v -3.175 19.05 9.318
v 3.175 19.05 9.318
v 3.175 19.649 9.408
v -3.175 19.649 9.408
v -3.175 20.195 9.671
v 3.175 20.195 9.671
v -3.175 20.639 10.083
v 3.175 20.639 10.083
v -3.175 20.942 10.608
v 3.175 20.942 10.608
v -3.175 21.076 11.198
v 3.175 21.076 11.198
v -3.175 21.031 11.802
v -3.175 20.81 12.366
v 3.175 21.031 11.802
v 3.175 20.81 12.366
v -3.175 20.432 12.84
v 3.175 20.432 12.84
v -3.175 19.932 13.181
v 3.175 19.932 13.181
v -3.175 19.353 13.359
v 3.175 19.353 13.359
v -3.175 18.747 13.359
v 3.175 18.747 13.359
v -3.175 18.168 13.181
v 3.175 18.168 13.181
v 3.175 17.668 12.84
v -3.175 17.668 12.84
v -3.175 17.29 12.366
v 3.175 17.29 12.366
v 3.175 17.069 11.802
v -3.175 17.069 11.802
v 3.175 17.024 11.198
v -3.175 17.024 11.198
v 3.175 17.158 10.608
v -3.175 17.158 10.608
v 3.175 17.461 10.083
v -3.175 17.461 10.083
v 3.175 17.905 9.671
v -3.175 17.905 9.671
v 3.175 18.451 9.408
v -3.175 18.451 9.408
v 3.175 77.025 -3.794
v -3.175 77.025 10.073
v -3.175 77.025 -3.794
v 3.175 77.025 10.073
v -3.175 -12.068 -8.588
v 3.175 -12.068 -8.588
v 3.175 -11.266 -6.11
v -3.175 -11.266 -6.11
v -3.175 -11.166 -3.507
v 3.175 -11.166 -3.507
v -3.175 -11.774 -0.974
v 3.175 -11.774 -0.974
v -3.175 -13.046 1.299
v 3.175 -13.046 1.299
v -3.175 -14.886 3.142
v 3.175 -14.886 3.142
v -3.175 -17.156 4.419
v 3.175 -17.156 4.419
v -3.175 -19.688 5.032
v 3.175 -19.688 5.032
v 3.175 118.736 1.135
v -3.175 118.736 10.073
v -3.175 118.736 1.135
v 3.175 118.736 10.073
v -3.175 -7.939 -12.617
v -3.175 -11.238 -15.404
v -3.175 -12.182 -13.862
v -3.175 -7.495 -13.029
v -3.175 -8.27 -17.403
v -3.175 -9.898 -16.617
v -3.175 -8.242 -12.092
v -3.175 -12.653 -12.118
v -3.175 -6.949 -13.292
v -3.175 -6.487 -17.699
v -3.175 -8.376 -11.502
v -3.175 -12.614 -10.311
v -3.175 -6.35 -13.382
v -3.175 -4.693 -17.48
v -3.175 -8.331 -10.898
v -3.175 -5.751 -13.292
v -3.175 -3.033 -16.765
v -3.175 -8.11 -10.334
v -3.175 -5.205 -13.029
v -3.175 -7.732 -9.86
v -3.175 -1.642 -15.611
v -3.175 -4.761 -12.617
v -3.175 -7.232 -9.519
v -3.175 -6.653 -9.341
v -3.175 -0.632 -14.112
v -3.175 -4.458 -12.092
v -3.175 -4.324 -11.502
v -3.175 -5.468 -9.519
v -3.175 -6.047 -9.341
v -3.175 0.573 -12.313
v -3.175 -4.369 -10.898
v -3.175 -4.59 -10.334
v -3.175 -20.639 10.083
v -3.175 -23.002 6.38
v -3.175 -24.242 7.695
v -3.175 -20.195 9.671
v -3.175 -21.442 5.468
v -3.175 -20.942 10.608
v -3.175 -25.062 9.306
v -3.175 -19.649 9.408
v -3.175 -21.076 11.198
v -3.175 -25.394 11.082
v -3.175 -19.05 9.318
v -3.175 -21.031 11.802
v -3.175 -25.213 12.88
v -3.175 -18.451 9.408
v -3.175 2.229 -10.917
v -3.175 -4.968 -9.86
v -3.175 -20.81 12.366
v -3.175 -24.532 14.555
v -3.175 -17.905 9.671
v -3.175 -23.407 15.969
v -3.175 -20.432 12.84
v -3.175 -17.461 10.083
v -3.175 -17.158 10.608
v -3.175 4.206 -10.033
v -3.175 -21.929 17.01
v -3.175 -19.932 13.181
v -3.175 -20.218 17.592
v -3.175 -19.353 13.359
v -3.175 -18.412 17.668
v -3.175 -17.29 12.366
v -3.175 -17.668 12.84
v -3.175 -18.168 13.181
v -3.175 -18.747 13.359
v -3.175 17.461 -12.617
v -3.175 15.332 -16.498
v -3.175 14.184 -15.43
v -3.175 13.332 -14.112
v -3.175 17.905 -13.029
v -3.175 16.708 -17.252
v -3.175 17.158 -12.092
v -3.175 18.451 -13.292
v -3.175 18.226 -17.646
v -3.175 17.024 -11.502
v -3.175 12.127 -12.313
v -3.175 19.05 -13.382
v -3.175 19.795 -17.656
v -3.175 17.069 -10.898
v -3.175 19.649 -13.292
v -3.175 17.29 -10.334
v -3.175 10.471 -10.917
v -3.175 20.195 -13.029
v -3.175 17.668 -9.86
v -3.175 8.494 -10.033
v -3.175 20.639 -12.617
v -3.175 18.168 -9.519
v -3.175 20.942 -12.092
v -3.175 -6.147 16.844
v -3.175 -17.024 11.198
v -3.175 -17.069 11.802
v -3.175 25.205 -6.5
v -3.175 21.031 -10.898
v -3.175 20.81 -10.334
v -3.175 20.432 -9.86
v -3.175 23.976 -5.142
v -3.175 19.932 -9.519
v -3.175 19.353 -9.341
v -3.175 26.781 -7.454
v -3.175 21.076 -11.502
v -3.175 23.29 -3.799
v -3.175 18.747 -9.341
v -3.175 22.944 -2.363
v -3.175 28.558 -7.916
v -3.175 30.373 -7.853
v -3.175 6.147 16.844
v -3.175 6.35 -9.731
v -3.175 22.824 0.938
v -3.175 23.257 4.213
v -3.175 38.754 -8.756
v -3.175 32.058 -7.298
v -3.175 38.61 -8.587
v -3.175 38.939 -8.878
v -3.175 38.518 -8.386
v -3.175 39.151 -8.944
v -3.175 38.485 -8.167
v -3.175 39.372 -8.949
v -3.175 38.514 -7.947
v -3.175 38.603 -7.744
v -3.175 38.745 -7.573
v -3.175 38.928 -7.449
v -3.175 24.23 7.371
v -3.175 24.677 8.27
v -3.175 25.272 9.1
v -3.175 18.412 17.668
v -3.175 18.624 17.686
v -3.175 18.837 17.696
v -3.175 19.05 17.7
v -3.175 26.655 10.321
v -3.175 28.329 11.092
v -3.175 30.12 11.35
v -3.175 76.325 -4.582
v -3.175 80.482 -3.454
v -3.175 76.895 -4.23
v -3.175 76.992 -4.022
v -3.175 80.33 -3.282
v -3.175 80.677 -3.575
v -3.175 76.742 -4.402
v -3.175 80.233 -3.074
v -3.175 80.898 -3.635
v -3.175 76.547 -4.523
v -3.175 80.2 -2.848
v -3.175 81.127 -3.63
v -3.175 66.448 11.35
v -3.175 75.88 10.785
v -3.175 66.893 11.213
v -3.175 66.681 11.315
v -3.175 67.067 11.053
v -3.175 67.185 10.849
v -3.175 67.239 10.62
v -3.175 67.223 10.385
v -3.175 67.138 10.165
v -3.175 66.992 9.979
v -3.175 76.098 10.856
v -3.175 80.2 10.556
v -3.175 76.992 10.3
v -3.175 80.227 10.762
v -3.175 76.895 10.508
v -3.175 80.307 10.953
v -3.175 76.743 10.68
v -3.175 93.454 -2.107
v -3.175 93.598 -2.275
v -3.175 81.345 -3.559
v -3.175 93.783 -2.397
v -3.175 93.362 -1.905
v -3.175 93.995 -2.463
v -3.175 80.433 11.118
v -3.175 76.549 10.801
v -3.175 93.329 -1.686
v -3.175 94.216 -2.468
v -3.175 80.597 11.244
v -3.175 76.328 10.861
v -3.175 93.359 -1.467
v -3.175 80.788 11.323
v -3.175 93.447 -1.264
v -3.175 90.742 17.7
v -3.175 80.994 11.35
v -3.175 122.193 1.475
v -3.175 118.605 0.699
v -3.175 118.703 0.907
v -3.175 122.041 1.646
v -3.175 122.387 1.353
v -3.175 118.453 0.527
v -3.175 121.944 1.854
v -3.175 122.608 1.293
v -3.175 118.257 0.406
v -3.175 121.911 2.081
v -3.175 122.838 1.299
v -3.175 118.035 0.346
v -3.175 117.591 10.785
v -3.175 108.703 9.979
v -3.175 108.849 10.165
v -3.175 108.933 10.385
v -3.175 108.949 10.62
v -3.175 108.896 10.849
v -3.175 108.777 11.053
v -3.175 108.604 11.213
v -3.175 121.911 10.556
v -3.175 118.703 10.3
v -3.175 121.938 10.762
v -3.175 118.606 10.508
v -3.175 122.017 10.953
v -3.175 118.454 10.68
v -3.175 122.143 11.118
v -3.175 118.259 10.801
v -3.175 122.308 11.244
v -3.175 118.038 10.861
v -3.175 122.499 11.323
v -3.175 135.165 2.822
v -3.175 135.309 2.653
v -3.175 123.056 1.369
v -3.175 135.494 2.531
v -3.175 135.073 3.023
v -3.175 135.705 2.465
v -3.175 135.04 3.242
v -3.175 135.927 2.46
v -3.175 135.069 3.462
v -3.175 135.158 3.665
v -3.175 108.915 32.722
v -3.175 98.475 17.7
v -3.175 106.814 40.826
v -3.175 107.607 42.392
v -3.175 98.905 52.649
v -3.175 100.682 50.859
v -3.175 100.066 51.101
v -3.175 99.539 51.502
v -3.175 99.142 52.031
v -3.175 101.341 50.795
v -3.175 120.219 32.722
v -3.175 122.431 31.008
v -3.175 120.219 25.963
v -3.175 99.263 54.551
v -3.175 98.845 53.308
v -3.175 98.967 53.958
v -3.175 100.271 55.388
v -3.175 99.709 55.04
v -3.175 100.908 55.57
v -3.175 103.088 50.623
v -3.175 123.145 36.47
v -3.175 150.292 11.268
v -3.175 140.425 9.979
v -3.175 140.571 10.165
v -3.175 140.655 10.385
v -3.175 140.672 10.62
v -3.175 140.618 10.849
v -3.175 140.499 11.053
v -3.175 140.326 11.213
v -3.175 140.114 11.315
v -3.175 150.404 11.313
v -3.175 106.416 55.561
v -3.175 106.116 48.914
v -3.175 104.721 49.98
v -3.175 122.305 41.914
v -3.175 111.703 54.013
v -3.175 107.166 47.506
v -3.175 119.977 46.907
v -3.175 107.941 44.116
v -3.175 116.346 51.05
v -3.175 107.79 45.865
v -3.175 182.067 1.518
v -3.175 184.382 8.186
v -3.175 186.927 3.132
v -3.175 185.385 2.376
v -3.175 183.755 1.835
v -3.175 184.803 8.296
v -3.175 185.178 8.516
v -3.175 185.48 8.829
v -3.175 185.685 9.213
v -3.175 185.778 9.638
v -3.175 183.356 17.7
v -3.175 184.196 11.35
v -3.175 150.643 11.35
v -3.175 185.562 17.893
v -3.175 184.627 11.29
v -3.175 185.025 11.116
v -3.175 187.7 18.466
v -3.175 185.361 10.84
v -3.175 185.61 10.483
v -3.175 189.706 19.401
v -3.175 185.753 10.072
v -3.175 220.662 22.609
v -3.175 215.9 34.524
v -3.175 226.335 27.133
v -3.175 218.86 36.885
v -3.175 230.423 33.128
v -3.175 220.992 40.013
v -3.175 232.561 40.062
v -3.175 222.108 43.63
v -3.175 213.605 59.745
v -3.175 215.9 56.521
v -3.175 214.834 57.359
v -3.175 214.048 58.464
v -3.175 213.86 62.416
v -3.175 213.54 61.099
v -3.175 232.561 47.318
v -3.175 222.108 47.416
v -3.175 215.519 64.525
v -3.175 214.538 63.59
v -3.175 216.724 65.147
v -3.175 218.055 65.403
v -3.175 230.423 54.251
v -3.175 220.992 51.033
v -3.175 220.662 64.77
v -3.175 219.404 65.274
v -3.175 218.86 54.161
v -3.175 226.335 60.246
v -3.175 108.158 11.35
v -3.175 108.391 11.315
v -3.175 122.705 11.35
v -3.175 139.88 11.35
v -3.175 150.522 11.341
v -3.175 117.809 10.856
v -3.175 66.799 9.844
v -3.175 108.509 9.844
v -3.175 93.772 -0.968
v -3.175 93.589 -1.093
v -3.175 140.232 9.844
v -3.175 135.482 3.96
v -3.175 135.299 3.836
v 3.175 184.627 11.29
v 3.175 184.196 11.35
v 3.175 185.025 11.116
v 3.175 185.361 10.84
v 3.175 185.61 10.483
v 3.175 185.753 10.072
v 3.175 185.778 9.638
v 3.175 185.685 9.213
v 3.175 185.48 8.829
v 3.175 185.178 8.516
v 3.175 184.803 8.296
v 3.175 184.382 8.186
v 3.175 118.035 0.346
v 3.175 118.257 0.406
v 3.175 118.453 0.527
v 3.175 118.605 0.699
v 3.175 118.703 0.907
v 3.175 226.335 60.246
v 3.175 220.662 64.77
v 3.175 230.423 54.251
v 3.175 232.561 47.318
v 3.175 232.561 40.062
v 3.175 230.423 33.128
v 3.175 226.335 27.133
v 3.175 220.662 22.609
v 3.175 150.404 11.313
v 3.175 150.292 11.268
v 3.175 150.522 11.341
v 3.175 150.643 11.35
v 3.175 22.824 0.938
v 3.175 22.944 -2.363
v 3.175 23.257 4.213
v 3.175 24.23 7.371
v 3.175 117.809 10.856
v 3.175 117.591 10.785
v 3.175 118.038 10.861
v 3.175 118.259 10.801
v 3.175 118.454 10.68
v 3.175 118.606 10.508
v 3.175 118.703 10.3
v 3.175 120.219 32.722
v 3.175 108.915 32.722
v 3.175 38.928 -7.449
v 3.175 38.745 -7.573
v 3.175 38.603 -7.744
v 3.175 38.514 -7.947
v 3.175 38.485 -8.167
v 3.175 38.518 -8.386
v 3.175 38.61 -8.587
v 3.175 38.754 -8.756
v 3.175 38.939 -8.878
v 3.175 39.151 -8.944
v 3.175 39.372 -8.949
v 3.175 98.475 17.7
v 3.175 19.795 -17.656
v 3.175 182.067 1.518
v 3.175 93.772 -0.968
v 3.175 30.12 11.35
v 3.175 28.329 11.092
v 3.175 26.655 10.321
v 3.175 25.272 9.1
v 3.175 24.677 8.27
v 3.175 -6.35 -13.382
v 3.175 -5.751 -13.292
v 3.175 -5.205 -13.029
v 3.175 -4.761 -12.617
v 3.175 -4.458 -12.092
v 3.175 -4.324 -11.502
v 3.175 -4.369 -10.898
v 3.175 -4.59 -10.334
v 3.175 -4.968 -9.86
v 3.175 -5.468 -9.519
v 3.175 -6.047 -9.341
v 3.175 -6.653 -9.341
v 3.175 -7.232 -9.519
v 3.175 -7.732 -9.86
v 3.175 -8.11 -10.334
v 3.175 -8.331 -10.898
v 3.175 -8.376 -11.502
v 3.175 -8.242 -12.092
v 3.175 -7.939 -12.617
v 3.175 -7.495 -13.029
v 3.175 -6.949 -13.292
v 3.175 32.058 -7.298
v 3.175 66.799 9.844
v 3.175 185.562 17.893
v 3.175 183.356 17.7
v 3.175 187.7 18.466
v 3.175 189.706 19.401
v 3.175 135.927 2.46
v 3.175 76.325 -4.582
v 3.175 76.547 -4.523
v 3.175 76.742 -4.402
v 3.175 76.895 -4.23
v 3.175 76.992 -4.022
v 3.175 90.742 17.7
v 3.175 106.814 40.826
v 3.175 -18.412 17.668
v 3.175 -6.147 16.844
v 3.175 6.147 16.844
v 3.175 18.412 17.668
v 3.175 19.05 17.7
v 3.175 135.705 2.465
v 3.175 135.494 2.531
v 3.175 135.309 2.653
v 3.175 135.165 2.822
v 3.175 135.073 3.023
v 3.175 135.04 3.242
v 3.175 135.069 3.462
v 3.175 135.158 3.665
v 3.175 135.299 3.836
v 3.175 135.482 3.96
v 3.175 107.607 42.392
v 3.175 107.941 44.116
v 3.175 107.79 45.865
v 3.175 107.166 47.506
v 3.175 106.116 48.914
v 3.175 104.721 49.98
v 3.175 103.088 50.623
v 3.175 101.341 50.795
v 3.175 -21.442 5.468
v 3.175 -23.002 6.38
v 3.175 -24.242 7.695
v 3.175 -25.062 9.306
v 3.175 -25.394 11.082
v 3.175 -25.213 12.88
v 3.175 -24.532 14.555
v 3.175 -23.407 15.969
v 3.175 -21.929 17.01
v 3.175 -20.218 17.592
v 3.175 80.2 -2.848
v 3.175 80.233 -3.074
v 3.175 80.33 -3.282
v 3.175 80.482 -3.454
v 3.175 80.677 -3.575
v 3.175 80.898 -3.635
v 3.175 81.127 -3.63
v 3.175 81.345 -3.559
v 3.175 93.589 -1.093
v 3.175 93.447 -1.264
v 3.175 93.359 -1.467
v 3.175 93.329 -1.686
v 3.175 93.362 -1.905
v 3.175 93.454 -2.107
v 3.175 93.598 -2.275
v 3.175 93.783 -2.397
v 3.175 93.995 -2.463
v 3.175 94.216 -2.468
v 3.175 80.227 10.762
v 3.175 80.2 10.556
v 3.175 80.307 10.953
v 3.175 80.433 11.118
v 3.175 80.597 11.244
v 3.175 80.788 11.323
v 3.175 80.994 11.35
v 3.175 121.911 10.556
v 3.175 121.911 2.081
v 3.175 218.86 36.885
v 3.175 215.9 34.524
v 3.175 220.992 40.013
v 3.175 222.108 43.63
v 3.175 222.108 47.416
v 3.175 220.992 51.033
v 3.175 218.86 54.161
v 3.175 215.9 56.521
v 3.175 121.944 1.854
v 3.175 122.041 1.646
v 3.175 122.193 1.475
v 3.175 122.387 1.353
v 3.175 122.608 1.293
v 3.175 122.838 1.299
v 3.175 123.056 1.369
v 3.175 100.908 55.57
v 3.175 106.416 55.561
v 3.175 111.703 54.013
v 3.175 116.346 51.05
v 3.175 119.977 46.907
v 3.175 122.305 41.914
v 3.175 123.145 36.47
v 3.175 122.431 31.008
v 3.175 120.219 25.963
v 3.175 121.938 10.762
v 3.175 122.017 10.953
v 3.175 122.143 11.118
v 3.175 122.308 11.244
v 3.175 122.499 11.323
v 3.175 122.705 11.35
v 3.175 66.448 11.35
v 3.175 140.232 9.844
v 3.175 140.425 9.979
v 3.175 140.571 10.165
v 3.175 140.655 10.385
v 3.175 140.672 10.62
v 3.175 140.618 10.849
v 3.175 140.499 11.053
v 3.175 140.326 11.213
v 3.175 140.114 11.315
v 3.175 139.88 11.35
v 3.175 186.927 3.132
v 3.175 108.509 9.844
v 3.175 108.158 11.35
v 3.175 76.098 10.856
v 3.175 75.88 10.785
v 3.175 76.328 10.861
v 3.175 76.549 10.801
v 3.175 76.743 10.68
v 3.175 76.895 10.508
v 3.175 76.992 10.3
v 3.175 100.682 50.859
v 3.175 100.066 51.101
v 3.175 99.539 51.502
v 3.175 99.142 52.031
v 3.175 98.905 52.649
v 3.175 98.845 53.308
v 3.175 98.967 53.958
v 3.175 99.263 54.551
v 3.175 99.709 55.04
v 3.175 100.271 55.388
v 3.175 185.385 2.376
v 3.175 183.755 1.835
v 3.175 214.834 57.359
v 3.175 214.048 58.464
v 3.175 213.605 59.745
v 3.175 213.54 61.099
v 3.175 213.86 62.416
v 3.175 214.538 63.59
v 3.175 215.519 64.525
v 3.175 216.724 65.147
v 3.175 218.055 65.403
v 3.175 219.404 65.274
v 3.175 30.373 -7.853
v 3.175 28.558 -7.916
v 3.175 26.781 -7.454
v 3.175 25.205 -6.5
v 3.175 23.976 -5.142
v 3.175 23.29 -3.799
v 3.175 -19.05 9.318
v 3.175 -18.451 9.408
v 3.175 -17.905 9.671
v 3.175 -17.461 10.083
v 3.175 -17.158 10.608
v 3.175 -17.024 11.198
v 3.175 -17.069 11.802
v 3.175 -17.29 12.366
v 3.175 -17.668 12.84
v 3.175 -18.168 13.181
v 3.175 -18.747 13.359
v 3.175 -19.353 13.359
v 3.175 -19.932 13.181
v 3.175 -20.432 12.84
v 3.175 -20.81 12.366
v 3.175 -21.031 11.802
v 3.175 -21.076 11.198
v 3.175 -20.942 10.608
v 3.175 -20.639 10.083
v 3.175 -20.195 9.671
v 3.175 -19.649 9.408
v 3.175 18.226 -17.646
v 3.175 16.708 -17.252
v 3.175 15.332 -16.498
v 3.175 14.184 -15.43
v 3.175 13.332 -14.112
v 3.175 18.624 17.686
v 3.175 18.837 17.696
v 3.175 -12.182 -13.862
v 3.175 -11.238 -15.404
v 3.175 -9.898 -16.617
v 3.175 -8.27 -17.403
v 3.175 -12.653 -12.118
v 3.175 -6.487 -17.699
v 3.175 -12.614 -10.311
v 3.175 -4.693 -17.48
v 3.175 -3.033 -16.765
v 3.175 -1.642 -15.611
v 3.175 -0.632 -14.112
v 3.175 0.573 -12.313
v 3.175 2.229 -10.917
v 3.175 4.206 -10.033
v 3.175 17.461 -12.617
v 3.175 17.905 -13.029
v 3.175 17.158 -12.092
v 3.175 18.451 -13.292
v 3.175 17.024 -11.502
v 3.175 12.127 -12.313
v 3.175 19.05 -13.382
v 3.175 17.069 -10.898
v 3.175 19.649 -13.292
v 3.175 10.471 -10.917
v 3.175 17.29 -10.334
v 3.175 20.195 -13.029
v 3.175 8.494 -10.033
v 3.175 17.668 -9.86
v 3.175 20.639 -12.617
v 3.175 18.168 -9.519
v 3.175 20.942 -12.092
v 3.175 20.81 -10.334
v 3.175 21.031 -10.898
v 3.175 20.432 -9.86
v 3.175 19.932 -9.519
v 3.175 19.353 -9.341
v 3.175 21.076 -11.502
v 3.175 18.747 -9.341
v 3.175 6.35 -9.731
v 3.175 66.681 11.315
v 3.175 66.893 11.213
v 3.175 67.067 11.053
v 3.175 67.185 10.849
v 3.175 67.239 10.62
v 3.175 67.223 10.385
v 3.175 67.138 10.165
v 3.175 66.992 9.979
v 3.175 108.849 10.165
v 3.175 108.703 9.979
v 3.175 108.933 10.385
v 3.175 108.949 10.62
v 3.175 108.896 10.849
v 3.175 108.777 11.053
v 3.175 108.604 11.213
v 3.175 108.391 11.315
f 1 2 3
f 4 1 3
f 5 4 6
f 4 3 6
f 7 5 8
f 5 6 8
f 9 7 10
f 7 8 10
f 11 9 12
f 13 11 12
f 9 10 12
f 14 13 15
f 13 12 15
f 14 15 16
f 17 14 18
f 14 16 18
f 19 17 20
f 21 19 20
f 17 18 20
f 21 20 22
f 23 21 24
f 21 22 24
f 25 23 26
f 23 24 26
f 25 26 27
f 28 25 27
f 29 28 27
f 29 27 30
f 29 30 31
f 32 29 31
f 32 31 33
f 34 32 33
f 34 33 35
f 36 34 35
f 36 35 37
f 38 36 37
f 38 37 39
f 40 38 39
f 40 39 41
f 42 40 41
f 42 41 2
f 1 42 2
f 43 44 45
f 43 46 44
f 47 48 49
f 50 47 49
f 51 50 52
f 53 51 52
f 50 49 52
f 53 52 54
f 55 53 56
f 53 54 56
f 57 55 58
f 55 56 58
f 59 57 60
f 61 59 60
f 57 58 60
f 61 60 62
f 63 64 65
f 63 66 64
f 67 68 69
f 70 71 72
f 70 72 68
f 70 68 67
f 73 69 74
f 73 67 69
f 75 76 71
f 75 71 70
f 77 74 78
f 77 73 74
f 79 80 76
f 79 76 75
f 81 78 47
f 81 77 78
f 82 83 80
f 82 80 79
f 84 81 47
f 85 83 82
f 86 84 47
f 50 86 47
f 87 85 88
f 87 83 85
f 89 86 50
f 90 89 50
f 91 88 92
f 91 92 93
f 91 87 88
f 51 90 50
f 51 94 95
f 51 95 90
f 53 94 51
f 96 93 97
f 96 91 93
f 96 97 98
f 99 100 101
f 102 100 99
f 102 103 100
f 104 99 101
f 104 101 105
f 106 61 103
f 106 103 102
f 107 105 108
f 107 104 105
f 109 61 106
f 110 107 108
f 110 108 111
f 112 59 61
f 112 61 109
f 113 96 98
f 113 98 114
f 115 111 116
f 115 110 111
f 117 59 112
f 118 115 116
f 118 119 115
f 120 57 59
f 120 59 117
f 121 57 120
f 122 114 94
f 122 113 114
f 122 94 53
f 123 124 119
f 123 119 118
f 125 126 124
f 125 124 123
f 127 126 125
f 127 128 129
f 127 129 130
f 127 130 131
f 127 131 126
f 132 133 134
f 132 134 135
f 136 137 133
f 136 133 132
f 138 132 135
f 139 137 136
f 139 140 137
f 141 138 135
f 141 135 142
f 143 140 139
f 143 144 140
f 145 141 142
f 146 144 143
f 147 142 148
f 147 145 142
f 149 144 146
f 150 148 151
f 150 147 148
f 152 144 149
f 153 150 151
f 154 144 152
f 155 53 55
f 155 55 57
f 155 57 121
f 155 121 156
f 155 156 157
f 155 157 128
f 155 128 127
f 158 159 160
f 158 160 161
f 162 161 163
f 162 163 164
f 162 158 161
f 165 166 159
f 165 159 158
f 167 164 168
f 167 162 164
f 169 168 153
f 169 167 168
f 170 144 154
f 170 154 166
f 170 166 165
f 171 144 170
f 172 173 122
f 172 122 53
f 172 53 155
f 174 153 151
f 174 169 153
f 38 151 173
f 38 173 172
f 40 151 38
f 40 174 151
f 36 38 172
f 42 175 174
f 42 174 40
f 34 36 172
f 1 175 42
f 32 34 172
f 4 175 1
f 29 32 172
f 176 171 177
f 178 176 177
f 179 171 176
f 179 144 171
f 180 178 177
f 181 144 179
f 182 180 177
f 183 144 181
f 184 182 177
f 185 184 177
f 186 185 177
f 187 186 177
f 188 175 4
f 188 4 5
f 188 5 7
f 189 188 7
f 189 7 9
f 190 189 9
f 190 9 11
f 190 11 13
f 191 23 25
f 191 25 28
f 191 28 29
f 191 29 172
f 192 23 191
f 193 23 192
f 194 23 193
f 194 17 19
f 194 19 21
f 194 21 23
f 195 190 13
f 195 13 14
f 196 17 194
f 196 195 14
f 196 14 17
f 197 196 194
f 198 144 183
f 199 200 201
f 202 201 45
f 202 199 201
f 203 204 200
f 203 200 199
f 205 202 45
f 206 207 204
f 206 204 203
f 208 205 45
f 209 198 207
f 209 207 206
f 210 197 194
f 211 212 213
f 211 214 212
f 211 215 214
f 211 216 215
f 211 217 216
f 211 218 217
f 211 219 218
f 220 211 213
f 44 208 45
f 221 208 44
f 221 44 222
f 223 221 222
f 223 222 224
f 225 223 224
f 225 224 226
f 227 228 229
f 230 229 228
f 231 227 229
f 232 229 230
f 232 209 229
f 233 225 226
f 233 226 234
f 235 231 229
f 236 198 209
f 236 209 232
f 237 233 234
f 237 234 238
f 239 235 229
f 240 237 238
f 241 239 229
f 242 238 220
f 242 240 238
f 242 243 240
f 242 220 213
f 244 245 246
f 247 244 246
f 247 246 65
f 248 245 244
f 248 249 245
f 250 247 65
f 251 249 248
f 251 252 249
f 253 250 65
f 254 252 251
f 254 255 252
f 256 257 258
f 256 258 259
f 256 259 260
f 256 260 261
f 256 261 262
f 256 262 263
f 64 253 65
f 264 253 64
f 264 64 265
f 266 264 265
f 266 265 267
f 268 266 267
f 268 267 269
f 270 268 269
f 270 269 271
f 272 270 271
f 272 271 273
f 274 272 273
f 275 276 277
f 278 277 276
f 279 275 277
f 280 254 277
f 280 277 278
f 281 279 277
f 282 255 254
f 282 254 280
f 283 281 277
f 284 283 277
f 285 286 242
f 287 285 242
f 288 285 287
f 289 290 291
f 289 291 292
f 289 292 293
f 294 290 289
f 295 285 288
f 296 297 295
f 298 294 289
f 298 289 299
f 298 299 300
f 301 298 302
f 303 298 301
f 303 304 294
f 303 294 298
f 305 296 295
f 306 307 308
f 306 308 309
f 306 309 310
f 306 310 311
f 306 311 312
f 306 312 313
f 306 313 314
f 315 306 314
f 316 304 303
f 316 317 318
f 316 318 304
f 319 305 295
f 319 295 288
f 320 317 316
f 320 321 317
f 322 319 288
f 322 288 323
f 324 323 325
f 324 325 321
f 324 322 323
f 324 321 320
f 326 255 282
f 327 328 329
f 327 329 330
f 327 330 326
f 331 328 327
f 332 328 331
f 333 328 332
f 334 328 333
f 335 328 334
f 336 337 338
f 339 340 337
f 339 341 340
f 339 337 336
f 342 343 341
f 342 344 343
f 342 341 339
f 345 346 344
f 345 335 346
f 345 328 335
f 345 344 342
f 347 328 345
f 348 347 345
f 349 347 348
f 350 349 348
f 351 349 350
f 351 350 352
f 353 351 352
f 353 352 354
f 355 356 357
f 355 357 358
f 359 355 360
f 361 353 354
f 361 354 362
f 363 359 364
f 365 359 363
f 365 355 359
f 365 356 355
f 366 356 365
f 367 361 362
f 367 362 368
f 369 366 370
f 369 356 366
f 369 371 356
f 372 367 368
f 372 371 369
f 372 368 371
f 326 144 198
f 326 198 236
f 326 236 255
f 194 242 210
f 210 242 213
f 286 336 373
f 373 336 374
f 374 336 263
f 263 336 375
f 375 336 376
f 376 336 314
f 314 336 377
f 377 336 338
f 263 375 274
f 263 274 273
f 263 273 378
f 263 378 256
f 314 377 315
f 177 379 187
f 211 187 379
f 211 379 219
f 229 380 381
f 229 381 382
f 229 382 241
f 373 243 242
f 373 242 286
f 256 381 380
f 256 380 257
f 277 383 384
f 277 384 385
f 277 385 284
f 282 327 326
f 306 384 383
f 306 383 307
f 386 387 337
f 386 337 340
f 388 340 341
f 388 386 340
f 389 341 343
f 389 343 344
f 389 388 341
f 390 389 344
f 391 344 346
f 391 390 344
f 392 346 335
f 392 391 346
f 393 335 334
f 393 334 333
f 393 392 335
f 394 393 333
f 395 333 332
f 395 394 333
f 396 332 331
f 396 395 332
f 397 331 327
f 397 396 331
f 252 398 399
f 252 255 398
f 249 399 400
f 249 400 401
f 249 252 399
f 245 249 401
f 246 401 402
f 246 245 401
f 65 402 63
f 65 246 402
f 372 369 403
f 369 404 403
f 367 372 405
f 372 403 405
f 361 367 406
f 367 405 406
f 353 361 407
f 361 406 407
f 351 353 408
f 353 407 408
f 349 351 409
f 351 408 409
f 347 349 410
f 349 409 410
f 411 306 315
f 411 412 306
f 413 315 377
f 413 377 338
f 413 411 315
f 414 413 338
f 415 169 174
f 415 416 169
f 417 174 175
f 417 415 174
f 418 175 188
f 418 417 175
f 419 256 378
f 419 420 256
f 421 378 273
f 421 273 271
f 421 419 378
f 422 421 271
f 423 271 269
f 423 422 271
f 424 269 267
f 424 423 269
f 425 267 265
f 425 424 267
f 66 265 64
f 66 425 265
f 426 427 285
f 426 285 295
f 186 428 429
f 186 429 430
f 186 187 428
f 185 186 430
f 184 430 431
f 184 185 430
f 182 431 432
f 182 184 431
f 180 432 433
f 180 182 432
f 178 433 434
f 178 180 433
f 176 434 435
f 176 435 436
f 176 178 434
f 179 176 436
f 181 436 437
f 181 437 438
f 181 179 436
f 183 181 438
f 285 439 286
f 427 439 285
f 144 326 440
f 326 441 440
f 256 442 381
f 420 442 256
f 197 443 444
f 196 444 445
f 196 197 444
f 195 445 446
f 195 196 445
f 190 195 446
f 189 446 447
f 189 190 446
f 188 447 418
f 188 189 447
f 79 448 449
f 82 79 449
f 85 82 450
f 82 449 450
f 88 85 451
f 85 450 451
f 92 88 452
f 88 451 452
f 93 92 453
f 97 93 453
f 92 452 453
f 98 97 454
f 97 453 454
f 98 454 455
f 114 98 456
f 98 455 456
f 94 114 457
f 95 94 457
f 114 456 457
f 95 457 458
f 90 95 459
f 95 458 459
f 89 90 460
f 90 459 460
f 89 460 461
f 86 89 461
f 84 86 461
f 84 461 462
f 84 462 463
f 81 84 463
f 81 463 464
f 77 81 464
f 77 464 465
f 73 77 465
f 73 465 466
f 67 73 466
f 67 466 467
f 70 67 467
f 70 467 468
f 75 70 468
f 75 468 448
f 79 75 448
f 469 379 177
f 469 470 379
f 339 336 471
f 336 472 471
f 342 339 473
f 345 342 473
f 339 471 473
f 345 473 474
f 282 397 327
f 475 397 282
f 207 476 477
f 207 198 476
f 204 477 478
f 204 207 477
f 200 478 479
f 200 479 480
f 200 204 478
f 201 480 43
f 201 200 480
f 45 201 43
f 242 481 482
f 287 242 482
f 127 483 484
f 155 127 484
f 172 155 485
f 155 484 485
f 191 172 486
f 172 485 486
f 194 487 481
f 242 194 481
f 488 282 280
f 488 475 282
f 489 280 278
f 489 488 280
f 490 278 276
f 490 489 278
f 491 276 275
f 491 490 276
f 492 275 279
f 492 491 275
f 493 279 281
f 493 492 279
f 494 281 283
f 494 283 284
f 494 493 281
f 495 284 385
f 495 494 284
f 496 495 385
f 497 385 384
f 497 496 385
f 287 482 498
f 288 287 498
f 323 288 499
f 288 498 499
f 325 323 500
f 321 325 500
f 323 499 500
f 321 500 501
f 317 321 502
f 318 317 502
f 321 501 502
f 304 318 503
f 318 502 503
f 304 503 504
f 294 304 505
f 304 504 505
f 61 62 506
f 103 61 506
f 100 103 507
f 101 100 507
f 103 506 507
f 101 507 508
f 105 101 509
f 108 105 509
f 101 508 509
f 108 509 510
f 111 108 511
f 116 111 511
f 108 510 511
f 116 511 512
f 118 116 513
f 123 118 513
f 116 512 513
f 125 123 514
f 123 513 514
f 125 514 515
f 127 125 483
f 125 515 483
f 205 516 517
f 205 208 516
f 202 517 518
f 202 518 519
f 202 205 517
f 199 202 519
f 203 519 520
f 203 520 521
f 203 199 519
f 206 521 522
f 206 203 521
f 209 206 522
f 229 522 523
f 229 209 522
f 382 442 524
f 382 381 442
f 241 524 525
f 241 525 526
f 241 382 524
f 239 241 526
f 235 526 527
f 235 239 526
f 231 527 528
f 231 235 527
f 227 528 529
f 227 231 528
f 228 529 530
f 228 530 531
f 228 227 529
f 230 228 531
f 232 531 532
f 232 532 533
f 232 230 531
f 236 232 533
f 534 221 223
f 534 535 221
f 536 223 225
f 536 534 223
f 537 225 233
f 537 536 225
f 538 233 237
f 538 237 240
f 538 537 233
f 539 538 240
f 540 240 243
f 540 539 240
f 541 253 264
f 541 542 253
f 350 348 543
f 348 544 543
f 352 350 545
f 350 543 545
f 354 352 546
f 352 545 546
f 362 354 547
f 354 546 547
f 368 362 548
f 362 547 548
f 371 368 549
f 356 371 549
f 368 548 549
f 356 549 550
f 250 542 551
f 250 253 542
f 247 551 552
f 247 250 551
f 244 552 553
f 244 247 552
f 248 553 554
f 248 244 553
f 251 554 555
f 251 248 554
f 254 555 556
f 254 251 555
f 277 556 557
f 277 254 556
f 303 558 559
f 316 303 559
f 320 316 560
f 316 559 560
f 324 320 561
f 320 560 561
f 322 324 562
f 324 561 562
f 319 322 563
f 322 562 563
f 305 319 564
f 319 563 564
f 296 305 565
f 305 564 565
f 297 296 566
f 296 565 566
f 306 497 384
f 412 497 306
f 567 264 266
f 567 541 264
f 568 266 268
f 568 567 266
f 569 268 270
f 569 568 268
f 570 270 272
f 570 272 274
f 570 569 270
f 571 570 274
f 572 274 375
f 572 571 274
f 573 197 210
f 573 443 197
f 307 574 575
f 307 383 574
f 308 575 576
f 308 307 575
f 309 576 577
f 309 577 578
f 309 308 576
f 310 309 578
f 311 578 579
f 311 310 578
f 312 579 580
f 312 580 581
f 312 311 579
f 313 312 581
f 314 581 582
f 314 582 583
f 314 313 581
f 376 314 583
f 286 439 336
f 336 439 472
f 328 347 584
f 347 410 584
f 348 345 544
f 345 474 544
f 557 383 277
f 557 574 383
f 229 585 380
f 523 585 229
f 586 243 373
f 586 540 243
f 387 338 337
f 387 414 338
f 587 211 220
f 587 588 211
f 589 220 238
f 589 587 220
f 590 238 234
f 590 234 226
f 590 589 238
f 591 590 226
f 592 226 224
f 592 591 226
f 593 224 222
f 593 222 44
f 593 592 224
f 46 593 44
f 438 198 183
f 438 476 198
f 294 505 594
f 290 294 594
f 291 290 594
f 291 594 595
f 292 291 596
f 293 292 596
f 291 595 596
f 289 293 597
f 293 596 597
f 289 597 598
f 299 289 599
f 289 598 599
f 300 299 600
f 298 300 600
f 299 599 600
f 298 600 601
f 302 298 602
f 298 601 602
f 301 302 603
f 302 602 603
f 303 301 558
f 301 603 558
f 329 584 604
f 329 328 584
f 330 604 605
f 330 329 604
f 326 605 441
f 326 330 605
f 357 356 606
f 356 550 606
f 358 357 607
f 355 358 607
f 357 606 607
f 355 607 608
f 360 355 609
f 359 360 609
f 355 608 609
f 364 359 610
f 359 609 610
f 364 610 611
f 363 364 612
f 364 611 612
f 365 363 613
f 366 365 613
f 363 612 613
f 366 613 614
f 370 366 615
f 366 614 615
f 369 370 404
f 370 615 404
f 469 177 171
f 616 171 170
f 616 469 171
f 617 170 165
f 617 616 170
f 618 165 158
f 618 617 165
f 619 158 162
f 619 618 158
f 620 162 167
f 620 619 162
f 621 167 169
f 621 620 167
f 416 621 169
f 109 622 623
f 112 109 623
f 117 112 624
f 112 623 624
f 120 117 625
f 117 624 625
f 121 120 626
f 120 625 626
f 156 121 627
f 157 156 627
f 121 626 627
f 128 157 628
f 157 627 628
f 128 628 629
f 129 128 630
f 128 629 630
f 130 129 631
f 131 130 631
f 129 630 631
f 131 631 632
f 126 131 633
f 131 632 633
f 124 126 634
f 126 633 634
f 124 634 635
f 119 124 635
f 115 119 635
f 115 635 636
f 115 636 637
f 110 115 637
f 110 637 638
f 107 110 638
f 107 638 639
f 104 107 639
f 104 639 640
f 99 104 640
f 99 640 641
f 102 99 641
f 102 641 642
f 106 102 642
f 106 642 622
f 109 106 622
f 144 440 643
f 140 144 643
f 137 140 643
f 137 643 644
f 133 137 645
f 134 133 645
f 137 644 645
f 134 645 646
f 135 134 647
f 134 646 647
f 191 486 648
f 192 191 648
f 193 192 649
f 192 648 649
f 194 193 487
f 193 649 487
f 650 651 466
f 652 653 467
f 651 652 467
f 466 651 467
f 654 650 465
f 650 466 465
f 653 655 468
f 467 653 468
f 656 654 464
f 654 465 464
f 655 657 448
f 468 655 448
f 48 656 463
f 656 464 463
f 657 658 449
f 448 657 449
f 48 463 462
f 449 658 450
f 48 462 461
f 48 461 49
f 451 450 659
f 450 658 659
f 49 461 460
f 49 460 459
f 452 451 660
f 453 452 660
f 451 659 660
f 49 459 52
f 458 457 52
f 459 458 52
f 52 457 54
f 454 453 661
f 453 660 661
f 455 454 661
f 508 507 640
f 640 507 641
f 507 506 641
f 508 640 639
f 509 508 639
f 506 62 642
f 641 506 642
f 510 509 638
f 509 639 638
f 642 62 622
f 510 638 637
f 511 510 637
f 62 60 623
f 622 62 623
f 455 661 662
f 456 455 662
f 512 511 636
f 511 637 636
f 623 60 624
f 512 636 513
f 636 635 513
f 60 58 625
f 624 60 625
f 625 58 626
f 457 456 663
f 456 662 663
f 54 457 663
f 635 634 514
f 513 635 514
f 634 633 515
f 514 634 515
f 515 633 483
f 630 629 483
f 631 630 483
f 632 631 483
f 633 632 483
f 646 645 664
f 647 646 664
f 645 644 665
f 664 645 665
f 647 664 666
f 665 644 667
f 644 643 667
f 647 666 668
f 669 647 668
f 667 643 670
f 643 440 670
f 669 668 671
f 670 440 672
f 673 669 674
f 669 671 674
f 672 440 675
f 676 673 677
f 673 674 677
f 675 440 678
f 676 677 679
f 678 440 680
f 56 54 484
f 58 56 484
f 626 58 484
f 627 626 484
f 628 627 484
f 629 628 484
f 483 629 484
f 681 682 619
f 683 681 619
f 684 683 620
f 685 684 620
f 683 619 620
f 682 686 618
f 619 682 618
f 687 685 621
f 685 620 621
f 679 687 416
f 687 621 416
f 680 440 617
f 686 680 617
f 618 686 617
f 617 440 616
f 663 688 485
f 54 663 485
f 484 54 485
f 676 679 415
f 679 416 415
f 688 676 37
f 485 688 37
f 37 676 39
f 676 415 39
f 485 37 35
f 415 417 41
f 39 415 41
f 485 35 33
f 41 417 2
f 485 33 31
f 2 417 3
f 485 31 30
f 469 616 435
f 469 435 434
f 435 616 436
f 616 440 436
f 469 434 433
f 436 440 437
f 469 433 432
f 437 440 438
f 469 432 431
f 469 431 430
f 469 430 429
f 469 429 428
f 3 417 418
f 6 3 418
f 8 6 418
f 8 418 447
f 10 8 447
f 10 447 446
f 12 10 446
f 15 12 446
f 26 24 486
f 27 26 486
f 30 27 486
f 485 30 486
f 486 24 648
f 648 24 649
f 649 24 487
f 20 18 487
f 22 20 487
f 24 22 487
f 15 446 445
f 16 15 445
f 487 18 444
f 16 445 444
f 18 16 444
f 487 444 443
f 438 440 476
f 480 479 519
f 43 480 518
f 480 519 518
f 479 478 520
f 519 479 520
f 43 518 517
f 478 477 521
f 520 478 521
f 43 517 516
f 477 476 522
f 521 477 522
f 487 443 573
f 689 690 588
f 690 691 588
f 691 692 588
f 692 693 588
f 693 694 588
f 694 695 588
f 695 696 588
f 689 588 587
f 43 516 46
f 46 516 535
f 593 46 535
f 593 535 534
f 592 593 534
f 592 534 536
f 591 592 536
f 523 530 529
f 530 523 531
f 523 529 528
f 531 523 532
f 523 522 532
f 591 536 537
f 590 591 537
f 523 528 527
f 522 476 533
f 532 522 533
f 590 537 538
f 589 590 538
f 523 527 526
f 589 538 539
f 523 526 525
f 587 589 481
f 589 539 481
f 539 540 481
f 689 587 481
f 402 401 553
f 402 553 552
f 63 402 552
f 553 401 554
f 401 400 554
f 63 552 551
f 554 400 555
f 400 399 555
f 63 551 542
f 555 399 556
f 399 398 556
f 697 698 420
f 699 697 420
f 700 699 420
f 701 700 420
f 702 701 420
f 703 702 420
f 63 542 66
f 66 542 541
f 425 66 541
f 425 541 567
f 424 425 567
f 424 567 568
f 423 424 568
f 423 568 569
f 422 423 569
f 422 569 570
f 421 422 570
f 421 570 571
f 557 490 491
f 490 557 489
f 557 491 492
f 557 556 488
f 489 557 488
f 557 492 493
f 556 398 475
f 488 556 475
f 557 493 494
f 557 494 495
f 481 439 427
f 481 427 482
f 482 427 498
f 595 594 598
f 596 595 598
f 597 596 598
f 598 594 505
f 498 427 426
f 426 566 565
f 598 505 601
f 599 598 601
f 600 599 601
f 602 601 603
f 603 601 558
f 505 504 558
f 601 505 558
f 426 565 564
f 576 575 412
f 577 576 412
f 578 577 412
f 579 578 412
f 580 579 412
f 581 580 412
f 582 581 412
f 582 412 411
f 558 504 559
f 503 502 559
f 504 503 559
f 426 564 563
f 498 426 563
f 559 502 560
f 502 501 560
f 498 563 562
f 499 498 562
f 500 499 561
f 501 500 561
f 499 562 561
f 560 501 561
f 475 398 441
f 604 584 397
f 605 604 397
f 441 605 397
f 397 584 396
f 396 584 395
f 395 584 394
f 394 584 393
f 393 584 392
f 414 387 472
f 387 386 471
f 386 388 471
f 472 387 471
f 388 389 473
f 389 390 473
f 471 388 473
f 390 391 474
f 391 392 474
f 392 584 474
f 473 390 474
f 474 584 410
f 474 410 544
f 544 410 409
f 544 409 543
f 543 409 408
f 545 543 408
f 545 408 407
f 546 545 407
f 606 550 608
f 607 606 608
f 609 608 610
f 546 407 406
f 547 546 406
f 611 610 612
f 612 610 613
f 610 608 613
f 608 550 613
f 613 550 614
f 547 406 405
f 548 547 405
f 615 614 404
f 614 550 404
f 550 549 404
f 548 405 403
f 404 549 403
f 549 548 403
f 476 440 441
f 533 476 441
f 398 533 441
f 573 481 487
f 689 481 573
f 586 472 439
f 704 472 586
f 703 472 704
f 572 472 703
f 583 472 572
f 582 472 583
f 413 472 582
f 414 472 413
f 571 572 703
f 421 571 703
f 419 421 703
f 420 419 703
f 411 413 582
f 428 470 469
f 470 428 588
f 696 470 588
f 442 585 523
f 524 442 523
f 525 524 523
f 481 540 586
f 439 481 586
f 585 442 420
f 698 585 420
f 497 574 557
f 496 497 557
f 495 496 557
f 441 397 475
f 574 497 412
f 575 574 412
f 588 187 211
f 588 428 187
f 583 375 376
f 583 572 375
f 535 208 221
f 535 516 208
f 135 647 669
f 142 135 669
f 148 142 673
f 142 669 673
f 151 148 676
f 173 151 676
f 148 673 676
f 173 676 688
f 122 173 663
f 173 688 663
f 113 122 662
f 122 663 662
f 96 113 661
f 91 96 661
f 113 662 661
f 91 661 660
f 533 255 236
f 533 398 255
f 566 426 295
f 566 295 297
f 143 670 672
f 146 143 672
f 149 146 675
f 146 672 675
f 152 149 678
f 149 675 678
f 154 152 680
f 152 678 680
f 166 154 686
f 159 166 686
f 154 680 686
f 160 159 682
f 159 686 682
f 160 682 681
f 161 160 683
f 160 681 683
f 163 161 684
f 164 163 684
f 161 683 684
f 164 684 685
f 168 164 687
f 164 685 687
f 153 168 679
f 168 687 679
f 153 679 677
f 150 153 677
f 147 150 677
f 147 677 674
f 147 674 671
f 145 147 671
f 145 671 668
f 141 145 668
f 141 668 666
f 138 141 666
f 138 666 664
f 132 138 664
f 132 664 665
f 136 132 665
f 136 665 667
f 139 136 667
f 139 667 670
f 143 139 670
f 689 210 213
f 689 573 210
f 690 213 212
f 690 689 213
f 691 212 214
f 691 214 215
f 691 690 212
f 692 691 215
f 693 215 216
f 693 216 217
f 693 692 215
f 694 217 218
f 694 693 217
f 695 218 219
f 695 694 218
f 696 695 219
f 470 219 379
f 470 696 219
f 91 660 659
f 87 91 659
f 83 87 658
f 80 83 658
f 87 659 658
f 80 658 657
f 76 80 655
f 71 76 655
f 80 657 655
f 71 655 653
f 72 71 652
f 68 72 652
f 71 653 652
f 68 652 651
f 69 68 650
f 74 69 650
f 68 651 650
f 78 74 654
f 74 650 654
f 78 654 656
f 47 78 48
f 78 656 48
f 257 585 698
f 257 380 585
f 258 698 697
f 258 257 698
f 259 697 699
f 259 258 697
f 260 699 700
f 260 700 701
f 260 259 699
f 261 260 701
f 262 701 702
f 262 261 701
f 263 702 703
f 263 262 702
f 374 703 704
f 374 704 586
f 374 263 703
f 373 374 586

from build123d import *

# Parameters (mm, degrees)
BOSS_EXTRUDE1_DEPTH = 3.175
SKETCH2_R           = 2.032
CUT_EXTRUDE1_DEPTH  = 242.929632893
FILLET1_R           = 12.7
FILLET2_R           = 0.79375
FILLET3_R           = 6.35
BOSS_EXTRUDE2_DEPTH = 6.35
CUT_EXTRUDE2_DEPTH  = 242.929633019


with BuildPart() as part:
    # Sketch1 → Boss-Extrude1 (new, symmetric)
    with BuildSketch(Plane(origin=(0, 0, 0), x_dir=(0, 0, -1), z_dir=(1, 0, 0))):
        with BuildLine():
            Line((-17.7, 19.05), (-17.7, 183.35625))
            ThreePointArc((-17.7, 183.35625), (-18.132742006, 186.643251873), (-19.401477372, 189.70625))
            Line((-19.401477372, 189.70625), (-34.524445986, 215.9))
            ThreePointArc((-34.524445986, 215.9), (-45.522968614, 222.25), (-56.521491242, 215.9))
            ThreePointArc((-56.521491242, 215.9), (-63.027187227, 214.156804014), (-64.770383213, 220.6625))
            ThreePointArc((-64.770383213, 220.6625), (-43.689881509, 232.833333333), (-22.609379805, 220.6625))
            Line((-22.609379805, 220.6625), (-1.825, 184.662898174))
            Line((-1.825, 184.662898174), (17.656128594, 19.795145732))
            ThreePointArc((17.656128594, 19.795145732), (16.917823934, 15.996831704), (14.112111824, 13.332199875))
            ThreePointArc((14.112111824, 13.332199875), (9.73081975, 6.35), (14.112111824, -0.632199875))
            ThreePointArc((14.112111824, -0.632199875), (17.067800125, -9.112111824), (8.587888176, -12.067800125))
            ThreePointArc((8.587888176, -12.067800125), (-0.205881062, -12.332007866), (-5.032111824, -19.687800125))
            ThreePointArc((-5.032111824, -19.687800125), (-11.987800125, -25.367888176), (-17.667888176, -18.412199875))
            ThreePointArc((-17.667888176, -18.412199875), (-16.740874674, 0), (-17.667888176, 18.412199875))
            ThreePointArc((-17.667888176, 18.412199875), (-17.691966963, 18.730696003), (-17.7, 19.05))
        make_face()
        with BuildLine():
            Line((-11.35, 25.4), (-11.35, 69.85))
            Line((-11.35, 69.85), (10.604854268, 25.356128594))
            ThreePointArc((10.604854268, 25.356128594), (9.571869946, 25.145962066), (8.587888176, 24.767800125))
            ThreePointArc((8.587888176, 24.767800125), (0, 22.802180275), (-8.587888176, 24.767800125))
            ThreePointArc((-8.587888176, 24.767800125), (-9.933230928, 25.239932584), (-11.35, 25.4))
        make_face(mode=Mode.SUBTRACT)
        Polygon((9.490062912, 34.790548391), (-11.35, 77.025175321), (4.499528462, 77.025175321), align=None, mode=Mode.SUBTRACT)
        Polygon((4.124363626, 80.200175321), (-11.35, 80.200175321), (-11.35, 111.560636058), align=None, mode=Mode.SUBTRACT)
        Polygon((3.00957227, 89.634595118), (-11.35, 118.735811379), (-0.429090099, 118.735811379), align=None, mode=Mode.SUBTRACT)
        Polygon((-0.804254935, 121.910811379), (-11.35, 121.910811379), (-11.35, 143.282896982), align=None, mode=Mode.SUBTRACT)
        with BuildLine():
            Line((-8.185967852, 184.381854159), (-1.919046291, 131.345231176))
            Line((-1.919046291, 131.345231176), (-11.35, 150.458072303))
            Line((-11.35, 150.458072303), (-11.35, 184.195567726))
            ThreePointArc((-11.35, 184.195567726), (-9.855804513, 185.780323391), (-8.185967852, 184.381854159))
        make_face(mode=Mode.SUBTRACT)
    extrude(amount=BOSS_EXTRUDE1_DEPTH, both=True)

    # Sketch2 → Cut-Extrude1 (cut, through all)
    with BuildSketch(Plane(origin=(3.175, 0, 0), x_dir=(0, 0, -1), z_dir=(1, 0, 0))):
        with Locations((11.35, -6.35)):
            Circle(SKETCH2_R)
        with Locations((11.35, 19.05)):
            Circle(SKETCH2_R)
        with Locations((-11.35, 19.05)):
            Circle(SKETCH2_R)
        with Locations((-11.35, -19.05)):
            Circle(SKETCH2_R)
    extrude(amount=-CUT_EXTRUDE1_DEPTH, mode=Mode.SUBTRACT)

    # Fillet1
    fillet1_edges = [part.edges().sort_by_distance(p)[0] for p in [
        (0, 184.662898174, 1.825),
    ]]
    fillet(fillet1_edges, radius=FILLET1_R)

    # Fillet2
    fillet2_edges = [part.edges().sort_by_distance(p)[0] for p in [
        (0, 69.85, 11.35),
        (0, 34.790548391, -9.490062912),
        (0, 77.025175321, -4.499528462),
        (0, 77.025175321, 11.35),
        (0, 80.200175321, -4.124363626),
        (0, 111.560636058, 11.35),
        (0, 80.200175321, 11.35),
        (0, 89.634595118, -3.00957227),
        (0, 118.735811379, 0.429090099),
        (0, 118.735811379, 11.35),
        (0, 121.910811379, 0.804254935),
        (0, 143.282896982, 11.35),
        (0, 121.910811379, 11.35),
        (0, 150.458072303, 11.35),
        (0, 131.345231176, 1.919046291),
    ]]
    fillet(fillet2_edges, radius=FILLET2_R)

    # Fillet3
    fillet3_edges = [part.edges().sort_by_distance(p)[0] for p in [
        (0, 25.4, 11.35),
        (0, 25.356128594, -10.604854268),
    ]]
    fillet(fillet3_edges, radius=FILLET3_R)

    # Sketch3 → Boss-Extrude2 (add)
    with BuildSketch(Plane(origin=(3.175, 0, 0), x_dir=(0, 0, -1), z_dir=(1, 0, 0))):
        with BuildLine():
            Line((-17.7, 113.663160513), (-17.7, 90.742041294))
            Line((-17.7, 90.742041294), (-40.826076924, 106.814372593))
            ThreePointArc((-40.826076924, 106.814372593), (-47.50636364, 107.166070544), (-50.794697112, 101.340541809))
            ThreePointArc((-50.794697112, 101.340541809), (-52.976424691, 98.851804162), (-55.570143469, 100.907618649))
            ThreePointArc((-55.570143469, 100.907618649), (-45.805288512, 120.644406163), (-23.869094131, 118.721764812))
            Line((-23.869094131, 118.721764812), (-17.7, 113.663160513))
        make_face()
    extrude(amount=-BOSS_EXTRUDE2_DEPTH)

    # Sketch4 → Cut-Extrude2 (cut, through all)
    with BuildSketch(Plane(origin=(3.175, 0, 0), x_dir=(0, 0, -1), z_dir=(1, 0, 0))):
        Polygon((-17.7, 98.474994642), (-32.722386581, 108.91536353), (-32.722386581, 120.21942978), (-17.7, 120.21942978), align=None)
    extrude(amount=-CUT_EXTRUDE2_DEPTH, mode=Mode.SUBTRACT)


solid = part.part
